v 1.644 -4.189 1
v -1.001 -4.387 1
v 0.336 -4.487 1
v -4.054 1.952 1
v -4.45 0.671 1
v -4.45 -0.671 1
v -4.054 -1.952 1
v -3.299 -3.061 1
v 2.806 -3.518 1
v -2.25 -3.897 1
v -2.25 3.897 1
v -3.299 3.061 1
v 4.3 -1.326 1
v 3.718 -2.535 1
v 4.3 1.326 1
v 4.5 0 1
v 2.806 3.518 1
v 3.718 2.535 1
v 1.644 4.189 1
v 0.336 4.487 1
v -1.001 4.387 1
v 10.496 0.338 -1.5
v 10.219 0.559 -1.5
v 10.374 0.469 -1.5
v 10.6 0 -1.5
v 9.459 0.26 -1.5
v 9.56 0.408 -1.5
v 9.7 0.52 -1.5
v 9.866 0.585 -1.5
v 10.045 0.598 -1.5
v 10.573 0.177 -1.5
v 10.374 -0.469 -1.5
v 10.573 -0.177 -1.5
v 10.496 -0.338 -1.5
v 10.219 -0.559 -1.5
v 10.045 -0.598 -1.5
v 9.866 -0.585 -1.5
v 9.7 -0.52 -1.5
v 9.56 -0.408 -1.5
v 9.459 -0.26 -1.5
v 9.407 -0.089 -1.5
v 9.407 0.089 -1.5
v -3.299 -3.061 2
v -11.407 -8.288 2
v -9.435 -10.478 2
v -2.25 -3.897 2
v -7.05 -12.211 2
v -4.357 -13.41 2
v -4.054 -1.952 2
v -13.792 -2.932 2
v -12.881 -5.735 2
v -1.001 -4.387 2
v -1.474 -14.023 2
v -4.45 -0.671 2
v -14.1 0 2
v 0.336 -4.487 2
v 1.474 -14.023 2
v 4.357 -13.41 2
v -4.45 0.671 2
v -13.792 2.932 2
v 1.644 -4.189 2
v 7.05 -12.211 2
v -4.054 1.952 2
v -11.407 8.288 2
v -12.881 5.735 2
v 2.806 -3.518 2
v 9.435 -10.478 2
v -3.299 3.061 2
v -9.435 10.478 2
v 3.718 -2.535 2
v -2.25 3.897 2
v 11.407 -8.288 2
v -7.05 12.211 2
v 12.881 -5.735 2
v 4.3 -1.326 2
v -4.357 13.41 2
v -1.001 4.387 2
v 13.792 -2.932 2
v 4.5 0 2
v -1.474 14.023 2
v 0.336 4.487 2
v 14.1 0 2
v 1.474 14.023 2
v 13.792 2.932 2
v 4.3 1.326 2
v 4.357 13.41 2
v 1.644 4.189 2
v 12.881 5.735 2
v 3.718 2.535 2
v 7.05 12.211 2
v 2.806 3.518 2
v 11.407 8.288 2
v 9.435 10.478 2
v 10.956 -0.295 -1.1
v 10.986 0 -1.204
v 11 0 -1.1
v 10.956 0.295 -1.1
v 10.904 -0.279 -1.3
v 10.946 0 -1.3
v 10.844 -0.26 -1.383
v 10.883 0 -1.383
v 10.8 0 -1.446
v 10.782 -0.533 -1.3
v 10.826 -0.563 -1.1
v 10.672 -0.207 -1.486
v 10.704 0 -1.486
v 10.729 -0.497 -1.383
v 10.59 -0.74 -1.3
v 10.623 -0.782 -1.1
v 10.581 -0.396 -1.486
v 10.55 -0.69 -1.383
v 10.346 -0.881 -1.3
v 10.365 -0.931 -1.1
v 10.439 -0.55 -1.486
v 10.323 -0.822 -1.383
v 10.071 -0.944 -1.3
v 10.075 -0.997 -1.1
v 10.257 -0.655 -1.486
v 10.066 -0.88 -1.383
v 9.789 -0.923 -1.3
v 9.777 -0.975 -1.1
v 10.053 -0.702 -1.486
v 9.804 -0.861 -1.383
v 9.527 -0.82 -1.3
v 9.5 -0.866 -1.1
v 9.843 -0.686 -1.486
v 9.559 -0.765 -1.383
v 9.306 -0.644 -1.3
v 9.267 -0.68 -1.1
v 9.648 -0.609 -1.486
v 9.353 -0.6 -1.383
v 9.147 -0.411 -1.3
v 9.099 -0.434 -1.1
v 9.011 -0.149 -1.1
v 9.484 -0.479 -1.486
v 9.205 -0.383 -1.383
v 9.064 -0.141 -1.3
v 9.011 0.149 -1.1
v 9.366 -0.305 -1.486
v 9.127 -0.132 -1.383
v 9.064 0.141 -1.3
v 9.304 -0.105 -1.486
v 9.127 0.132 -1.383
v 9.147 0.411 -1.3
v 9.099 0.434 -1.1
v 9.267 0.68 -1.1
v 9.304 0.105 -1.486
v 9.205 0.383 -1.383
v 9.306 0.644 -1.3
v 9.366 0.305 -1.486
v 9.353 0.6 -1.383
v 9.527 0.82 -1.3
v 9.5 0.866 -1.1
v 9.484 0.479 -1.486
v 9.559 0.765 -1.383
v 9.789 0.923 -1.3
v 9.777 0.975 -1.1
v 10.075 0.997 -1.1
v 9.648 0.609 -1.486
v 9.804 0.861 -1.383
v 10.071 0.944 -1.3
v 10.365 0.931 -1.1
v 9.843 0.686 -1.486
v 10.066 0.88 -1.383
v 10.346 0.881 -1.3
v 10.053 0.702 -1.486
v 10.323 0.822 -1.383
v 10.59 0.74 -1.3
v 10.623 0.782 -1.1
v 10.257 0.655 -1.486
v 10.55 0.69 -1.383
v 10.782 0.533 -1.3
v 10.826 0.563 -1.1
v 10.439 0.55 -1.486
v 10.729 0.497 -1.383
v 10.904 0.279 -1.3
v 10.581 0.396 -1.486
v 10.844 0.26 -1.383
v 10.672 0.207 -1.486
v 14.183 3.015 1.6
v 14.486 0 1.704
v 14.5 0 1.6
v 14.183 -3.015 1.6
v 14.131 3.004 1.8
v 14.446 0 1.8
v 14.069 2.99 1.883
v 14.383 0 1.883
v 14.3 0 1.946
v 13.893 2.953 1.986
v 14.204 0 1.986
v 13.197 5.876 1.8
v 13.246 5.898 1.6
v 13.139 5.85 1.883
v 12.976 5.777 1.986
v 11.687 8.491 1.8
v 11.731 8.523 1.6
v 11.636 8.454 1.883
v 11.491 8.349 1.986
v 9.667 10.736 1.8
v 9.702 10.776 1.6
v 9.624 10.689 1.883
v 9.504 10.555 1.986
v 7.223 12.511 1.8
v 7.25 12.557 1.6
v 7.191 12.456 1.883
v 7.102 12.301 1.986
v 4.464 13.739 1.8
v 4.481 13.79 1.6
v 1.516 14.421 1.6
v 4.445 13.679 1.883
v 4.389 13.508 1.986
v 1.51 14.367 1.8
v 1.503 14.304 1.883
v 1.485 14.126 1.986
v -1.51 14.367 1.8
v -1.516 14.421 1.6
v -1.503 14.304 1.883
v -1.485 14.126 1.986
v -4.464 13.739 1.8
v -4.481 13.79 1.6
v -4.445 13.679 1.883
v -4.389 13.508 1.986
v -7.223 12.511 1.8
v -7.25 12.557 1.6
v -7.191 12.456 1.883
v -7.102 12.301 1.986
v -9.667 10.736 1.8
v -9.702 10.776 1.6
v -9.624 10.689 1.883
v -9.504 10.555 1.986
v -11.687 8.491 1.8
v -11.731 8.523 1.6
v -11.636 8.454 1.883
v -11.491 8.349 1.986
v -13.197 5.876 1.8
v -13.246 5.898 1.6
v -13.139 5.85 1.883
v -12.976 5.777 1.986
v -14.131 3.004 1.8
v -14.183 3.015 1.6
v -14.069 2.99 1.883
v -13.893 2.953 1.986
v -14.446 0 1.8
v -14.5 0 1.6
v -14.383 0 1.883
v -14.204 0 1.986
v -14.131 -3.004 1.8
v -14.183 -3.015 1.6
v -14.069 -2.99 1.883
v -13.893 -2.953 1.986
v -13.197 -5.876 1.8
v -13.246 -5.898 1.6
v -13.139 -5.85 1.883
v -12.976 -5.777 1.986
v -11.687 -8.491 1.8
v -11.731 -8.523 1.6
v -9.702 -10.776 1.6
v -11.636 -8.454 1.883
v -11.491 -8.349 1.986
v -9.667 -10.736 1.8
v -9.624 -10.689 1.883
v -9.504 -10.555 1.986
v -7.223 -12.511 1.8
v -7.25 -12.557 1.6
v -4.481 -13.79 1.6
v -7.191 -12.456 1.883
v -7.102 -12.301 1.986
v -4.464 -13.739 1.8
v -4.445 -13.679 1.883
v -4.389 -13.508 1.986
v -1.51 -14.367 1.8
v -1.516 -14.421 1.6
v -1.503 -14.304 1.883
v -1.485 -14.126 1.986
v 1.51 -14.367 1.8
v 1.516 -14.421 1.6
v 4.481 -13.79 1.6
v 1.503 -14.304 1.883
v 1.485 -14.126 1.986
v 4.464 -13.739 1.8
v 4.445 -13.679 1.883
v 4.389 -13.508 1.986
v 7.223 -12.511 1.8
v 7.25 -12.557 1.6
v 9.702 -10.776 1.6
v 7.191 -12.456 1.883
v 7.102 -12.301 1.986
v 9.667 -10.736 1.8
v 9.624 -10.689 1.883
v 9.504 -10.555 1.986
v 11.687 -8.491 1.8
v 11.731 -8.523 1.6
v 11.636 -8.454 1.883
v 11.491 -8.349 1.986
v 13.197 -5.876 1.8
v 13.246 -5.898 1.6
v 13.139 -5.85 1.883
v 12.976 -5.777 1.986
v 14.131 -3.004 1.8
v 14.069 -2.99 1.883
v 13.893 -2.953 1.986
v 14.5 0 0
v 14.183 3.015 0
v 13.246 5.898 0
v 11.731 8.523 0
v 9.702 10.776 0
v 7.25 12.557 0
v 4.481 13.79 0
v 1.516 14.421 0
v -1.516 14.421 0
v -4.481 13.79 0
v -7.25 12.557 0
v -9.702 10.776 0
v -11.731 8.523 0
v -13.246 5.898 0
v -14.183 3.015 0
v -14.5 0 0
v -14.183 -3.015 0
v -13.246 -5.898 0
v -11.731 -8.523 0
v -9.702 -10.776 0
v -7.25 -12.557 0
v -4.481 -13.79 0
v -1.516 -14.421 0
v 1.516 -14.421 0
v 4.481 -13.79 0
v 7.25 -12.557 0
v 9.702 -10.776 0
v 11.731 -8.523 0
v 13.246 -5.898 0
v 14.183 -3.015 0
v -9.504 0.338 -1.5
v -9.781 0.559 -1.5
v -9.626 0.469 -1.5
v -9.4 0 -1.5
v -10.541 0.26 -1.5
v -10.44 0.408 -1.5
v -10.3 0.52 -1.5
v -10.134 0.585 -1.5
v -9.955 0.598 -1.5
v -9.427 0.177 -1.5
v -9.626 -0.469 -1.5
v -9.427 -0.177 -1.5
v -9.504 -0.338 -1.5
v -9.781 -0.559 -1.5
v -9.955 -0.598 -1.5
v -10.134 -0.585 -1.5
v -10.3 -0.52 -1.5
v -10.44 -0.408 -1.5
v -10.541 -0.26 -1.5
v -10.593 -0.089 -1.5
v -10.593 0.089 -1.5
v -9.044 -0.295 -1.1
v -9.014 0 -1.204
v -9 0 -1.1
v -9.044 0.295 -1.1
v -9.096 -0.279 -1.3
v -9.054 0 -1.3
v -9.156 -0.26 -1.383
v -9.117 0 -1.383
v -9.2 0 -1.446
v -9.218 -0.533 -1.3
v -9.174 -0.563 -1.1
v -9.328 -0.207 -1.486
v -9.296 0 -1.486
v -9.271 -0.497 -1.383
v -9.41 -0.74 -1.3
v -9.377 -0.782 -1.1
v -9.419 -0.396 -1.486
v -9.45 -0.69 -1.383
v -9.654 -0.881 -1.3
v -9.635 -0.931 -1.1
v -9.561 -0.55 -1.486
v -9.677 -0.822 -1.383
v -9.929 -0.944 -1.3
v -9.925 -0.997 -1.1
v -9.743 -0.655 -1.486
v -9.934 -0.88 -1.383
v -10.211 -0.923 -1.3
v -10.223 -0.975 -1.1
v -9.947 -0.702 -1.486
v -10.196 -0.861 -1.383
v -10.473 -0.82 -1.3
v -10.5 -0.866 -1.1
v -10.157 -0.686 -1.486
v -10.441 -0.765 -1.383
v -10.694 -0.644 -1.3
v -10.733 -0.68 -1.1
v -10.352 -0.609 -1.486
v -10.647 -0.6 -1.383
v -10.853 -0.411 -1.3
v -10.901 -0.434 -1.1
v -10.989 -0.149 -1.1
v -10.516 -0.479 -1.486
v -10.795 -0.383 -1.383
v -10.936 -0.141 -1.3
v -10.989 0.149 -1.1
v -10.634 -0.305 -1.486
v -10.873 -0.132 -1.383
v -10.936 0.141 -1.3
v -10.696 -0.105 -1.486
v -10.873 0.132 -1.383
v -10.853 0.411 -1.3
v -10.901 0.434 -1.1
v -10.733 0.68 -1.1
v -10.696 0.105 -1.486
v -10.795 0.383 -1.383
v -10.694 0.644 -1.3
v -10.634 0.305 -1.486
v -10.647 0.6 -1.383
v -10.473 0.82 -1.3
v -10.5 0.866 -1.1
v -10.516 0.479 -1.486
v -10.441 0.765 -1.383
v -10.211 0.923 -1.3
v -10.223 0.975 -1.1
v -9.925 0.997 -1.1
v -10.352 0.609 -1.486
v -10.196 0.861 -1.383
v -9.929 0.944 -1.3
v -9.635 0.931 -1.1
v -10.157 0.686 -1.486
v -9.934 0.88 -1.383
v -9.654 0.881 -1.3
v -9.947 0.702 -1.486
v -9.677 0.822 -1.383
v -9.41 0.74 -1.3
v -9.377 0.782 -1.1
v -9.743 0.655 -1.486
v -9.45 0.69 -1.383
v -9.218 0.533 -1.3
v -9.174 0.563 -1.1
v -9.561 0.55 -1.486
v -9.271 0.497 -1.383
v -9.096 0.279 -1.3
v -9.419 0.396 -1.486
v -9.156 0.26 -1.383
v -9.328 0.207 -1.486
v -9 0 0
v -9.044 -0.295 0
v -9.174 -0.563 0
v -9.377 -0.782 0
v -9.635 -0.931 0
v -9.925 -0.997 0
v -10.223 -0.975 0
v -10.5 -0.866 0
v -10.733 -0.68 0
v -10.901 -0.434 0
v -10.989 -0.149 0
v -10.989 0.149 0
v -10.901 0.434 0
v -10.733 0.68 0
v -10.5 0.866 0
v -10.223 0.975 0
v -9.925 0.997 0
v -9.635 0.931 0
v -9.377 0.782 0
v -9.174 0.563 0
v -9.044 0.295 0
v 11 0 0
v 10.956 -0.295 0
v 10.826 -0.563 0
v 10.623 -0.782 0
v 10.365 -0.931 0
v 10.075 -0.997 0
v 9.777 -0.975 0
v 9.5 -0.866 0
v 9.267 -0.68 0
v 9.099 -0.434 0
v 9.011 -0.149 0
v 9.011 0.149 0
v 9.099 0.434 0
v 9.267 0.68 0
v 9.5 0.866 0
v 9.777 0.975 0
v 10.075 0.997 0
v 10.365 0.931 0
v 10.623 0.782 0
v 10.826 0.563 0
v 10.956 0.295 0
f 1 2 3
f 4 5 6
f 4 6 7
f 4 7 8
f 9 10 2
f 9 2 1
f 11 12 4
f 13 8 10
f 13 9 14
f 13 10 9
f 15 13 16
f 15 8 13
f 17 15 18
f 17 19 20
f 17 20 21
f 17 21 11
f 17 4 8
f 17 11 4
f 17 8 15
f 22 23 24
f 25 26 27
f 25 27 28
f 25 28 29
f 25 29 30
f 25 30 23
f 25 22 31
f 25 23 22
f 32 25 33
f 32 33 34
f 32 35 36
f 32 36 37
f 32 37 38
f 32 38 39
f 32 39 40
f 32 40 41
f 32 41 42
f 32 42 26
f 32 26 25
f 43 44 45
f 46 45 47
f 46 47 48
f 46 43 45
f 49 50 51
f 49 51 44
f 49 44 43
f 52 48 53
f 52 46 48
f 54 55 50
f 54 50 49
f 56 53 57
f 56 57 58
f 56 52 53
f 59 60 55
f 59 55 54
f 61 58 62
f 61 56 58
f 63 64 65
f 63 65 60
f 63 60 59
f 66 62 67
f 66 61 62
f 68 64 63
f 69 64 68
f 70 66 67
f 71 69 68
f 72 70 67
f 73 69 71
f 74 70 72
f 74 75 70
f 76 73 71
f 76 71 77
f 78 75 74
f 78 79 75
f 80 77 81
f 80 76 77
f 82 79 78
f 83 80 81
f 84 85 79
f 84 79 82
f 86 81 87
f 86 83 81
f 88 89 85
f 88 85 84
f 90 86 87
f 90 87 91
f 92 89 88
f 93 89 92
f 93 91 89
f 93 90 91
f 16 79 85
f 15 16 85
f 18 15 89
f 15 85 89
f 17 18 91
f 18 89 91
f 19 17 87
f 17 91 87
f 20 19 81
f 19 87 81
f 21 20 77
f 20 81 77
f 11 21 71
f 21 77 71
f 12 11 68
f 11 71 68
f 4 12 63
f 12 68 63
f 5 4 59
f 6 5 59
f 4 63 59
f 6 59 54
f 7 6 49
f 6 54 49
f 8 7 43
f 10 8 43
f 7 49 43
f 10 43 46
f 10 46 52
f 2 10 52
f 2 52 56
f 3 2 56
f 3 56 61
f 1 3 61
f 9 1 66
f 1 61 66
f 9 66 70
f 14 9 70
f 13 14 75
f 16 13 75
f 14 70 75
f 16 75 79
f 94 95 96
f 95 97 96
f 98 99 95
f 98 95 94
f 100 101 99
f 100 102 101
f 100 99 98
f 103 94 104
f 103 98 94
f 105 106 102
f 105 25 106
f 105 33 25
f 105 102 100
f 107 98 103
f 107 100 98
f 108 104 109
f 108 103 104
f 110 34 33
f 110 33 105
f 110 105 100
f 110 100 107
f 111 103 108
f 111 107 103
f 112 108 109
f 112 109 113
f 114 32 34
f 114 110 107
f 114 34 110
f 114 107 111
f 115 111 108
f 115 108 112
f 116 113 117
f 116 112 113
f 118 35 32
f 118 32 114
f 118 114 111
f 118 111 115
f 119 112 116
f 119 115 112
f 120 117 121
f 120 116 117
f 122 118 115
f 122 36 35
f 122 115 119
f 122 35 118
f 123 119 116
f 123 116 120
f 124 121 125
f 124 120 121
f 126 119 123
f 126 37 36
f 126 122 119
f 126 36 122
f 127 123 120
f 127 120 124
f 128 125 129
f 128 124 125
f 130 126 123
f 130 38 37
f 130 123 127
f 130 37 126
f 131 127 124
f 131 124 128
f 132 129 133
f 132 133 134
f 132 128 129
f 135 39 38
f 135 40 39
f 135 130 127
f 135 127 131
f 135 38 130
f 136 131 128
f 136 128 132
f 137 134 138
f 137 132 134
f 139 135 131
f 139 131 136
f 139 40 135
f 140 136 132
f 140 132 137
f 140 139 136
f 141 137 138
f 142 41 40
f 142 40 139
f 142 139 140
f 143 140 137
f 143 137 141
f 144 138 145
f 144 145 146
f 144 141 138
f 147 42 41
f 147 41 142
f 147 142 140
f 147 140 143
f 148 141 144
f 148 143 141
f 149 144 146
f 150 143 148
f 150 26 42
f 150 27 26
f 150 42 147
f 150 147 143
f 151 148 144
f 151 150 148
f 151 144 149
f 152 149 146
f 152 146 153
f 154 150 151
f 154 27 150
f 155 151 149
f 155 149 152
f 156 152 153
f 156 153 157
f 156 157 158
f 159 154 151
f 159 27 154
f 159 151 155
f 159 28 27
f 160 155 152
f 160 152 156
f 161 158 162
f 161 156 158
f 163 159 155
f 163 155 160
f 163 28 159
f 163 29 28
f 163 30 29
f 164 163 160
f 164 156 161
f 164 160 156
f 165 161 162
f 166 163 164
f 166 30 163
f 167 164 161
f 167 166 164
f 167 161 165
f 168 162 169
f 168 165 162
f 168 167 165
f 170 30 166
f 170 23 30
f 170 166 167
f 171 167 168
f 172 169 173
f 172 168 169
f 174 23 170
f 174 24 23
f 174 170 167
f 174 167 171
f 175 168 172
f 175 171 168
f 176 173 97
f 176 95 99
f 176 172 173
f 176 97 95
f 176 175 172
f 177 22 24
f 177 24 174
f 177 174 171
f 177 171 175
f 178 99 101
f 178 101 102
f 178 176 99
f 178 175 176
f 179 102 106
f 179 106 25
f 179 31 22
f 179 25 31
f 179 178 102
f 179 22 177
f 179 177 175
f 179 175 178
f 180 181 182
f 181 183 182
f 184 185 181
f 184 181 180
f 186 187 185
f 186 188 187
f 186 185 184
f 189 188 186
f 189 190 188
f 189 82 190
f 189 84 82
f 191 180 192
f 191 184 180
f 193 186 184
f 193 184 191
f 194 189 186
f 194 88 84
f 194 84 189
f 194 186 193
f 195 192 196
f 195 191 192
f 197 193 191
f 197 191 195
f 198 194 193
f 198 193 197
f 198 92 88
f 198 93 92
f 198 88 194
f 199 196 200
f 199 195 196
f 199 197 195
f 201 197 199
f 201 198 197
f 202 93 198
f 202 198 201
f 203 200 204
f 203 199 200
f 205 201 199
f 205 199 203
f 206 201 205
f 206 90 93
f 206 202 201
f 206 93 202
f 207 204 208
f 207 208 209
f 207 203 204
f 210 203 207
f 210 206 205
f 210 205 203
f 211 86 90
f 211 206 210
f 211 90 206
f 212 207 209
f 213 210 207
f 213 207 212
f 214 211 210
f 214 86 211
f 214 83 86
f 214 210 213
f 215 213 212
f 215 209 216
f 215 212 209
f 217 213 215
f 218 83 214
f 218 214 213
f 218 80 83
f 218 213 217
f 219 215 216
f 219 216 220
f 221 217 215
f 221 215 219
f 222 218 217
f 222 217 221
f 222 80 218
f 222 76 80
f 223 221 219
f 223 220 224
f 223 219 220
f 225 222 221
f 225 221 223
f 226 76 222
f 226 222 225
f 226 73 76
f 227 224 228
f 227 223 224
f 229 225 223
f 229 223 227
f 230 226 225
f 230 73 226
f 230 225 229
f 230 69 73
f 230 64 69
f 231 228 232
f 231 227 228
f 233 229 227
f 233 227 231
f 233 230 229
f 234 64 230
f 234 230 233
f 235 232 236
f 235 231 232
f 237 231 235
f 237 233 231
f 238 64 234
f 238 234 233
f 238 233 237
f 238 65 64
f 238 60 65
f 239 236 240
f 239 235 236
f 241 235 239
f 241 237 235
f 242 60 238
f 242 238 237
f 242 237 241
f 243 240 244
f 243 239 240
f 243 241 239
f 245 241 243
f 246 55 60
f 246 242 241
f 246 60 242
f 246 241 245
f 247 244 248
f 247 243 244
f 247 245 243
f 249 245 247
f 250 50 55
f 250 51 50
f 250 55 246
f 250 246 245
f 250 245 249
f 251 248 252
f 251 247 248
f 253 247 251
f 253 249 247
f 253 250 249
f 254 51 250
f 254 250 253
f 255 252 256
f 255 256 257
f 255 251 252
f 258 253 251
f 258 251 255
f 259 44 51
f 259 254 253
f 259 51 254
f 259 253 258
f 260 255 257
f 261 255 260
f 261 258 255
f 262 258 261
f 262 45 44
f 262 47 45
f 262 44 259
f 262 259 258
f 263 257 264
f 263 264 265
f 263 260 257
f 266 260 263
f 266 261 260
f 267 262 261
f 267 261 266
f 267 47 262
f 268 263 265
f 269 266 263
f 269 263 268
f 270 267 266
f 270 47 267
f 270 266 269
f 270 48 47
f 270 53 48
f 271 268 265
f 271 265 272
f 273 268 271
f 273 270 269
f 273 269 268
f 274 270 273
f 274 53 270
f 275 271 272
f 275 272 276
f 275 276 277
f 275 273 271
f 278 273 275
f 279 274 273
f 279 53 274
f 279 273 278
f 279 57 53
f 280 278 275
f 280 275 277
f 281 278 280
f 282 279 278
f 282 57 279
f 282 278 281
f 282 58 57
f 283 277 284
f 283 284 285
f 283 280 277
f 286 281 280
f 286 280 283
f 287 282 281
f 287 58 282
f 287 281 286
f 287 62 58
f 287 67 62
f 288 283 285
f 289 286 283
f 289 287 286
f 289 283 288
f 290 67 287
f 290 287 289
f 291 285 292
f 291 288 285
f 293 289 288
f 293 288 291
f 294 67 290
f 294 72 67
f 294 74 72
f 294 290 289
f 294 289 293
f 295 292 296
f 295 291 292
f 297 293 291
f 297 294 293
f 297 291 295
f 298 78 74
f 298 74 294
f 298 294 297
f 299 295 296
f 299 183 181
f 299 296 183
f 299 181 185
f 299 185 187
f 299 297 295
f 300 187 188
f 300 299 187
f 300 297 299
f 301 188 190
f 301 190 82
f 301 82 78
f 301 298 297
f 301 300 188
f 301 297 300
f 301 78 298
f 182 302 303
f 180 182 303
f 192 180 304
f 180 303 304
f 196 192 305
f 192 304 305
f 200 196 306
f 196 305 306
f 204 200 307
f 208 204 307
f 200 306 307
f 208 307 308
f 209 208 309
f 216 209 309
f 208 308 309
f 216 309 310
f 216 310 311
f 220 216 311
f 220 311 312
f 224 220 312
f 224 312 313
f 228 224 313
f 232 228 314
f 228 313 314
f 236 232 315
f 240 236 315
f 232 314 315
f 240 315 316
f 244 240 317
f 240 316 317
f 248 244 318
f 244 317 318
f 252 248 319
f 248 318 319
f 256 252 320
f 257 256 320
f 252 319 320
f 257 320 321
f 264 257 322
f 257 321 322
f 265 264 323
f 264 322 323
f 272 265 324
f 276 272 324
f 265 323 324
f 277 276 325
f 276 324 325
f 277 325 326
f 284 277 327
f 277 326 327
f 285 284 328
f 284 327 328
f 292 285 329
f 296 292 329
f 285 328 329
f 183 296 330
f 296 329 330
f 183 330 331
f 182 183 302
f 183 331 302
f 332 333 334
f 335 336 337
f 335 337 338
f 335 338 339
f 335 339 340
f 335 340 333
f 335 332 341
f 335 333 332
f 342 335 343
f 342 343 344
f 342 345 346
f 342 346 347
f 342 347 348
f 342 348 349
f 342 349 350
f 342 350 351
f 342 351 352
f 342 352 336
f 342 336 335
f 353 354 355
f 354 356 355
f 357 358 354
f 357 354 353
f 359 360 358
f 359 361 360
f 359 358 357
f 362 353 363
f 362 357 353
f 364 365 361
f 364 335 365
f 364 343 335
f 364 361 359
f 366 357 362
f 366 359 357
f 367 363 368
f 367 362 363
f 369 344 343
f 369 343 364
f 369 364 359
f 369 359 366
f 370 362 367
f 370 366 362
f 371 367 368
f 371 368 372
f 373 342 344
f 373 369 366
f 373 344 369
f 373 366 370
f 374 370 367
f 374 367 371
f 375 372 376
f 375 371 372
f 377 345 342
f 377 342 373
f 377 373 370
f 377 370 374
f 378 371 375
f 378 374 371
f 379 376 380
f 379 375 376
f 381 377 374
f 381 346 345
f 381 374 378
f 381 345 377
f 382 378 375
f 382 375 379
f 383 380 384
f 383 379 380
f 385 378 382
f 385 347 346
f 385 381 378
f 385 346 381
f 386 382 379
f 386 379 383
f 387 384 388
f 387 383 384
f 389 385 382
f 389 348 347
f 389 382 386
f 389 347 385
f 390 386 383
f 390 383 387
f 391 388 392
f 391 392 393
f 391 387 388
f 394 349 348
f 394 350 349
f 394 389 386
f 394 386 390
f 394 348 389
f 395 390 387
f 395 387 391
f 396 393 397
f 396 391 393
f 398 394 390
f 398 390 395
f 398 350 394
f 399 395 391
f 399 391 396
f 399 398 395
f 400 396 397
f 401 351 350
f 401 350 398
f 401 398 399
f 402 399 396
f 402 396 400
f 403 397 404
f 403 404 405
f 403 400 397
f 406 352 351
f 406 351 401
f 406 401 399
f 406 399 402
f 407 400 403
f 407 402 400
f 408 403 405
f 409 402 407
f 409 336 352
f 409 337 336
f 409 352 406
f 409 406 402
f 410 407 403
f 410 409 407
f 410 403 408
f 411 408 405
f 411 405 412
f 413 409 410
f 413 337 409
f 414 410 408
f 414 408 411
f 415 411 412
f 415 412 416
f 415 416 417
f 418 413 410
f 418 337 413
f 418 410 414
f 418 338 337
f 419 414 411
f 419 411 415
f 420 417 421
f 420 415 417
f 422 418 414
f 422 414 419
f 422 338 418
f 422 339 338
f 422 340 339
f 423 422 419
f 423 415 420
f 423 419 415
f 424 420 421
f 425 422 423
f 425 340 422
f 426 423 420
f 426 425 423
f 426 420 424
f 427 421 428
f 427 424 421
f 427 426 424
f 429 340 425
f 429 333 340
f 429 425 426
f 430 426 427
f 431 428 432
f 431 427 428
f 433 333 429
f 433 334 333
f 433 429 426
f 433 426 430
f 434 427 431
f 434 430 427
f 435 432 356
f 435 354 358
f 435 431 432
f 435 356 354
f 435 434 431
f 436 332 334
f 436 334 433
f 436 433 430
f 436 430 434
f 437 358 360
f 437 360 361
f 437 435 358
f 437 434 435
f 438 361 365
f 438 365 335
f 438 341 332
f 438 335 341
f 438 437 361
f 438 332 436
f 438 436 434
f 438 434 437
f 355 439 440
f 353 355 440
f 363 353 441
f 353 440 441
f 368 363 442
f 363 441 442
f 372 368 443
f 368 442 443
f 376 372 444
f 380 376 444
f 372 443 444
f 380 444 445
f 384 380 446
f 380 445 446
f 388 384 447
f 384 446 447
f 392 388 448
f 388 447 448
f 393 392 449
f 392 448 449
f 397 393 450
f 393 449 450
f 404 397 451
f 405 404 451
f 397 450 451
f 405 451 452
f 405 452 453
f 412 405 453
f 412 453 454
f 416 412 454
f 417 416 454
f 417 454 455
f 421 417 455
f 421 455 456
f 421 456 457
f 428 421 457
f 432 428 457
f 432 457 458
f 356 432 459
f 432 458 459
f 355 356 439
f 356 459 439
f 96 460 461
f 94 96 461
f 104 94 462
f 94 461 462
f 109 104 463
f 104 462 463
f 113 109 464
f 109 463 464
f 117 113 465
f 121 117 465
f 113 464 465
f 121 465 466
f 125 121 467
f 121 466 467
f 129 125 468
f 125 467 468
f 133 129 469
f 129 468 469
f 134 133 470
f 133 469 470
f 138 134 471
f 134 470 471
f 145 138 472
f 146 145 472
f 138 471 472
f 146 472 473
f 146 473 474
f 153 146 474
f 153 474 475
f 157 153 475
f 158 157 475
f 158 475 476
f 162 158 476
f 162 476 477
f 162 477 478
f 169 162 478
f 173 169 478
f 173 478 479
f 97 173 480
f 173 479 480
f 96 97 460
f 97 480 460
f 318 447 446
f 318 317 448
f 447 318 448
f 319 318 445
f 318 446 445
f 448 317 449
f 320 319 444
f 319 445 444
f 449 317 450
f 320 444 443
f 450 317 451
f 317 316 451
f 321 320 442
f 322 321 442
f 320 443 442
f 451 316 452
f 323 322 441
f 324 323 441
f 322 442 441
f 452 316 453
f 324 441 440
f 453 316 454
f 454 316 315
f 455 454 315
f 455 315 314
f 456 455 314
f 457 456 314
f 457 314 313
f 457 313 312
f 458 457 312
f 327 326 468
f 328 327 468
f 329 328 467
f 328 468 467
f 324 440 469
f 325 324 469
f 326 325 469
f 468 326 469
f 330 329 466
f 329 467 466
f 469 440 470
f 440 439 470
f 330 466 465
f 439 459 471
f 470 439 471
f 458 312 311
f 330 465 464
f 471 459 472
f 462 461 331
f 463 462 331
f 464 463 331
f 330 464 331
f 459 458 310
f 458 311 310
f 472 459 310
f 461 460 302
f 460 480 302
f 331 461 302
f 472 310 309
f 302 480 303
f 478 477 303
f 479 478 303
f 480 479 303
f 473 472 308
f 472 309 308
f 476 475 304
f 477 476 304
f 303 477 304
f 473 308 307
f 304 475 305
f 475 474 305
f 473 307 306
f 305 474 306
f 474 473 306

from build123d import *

# Parameters (mm, degrees)
F0_R     = 14.5
F1_DEPTH = 2
F2_R     = 0.4
F3_R     = 1
F4_DEPTH = 1.5
F5_R     = 0.4
F6_R     = 4.5
F7_DEPTH = 1


with BuildPart() as f1:
    # F0 (on Top) → F1 (new body)
    with BuildSketch(Plane.XY):
        Circle(F0_R)
    extrude(amount=F1_DEPTH)

    # F2
    f2_edges = [f1.edges().sort_by_distance(p)[0] for p in [
        (-14.5, 0, 2),
    ]]
    fillet(f2_edges, radius=F2_R)

    # F3 (on face) → F4 (join)
    with BuildSketch(Plane(origin=(0, 0, 0), x_dir=(1, 0, 0), z_dir=(0, 0, -1))):
        with Locations((-10, 0)):
            Circle(F3_R)
        with Locations((10, 0)):
            Circle(F3_R)
    extrude(amount=F4_DEPTH)

    # F5
    f5_edges = [f1.edges().sort_by_distance(p)[0] for p in [
        (-11, 0, -1.5),
        (9, 0, -1.5),
    ]]
    fillet(f5_edges, radius=F5_R)

    # F6 (on face) → F7 (cut)
    with BuildSketch(Plane.XY.offset(2)):
        Circle(F6_R)
    extrude(amount=-F7_DEPTH, mode=Mode.SUBTRACT)


solid = f1.part
